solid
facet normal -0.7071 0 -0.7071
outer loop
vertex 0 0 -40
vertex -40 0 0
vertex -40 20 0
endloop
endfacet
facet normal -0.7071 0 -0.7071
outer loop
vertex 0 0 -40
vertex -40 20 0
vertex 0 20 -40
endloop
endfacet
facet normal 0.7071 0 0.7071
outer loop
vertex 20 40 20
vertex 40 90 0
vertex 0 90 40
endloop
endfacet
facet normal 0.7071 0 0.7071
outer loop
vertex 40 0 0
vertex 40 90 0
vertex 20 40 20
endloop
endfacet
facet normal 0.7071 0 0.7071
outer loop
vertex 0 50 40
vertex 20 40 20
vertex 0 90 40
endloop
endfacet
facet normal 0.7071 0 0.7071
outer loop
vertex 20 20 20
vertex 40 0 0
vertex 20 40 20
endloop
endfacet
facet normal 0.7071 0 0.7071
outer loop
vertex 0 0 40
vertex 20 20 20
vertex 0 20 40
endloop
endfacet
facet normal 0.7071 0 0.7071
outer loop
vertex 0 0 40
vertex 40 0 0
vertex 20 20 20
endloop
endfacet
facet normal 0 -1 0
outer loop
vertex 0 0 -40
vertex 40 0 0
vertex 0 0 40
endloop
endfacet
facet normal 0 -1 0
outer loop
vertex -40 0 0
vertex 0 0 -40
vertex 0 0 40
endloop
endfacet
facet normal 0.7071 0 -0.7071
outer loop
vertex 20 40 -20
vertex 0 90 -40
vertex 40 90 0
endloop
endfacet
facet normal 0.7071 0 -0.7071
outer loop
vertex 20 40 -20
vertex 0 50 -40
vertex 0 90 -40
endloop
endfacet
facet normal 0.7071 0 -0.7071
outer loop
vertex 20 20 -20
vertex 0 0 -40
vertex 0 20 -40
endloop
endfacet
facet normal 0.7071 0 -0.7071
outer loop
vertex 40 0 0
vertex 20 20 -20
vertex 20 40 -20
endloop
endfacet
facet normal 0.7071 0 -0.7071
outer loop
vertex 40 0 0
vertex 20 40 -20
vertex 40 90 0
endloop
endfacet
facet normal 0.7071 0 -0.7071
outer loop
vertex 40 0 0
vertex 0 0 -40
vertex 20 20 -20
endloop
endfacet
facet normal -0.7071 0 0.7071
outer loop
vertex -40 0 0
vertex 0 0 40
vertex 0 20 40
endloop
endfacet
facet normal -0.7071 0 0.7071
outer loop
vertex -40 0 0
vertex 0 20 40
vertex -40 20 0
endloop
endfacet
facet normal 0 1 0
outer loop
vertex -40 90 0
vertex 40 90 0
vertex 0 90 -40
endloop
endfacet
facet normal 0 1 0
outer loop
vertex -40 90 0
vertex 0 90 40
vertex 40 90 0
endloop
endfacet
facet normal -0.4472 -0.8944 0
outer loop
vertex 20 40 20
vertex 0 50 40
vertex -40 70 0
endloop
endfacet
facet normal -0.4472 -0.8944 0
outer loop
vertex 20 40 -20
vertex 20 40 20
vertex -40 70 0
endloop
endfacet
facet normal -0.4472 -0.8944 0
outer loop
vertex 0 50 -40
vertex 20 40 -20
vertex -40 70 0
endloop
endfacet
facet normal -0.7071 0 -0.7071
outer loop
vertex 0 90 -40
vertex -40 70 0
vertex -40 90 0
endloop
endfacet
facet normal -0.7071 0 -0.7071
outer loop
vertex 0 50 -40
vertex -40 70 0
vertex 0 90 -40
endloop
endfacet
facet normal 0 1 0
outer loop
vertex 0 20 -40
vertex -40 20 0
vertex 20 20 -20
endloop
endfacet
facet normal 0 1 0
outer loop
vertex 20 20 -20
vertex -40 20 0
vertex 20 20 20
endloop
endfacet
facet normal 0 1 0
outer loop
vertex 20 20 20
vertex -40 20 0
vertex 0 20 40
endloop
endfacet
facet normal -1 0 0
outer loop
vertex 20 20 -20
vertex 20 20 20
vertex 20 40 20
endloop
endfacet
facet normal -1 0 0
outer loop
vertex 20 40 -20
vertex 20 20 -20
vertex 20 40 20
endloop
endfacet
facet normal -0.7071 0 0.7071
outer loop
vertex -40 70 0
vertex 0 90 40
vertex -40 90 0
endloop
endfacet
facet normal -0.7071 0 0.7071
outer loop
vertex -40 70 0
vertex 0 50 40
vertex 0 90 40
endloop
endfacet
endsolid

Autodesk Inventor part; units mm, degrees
ref_plane "YZ Plane" through (0, 0, 0) normal (1, 0, 0) x (0, 1, 0)
ref_plane "XZ Plane" through (0, 0, 0) normal (0, 1, 0) x (-1, 0, 0)
ref_plane "XY Plane" through (0, 0, 0) normal (0, 0, 1) x (1, 0, 0)
sketch "Эскиз1" plane through (0, 0, 0) normal (0, 1, 0) x (-1, 0, 0)
  circle A0 centre (0, 0) radius 40
  line L0 (0, 40) -> (40, 0)
  line L1 (40, 0) -> (0, -40)
  line L2 (0, -40) -> (-40, 0)
  line L3 (-40, 0) -> (0, 40)
  dimension "d0" = 80
extrude "Выдавливание1" add sketch "Эскиз1" along normal blind 90 contours L1 L2 L3 L0
sketch "Эскиз2" plane through (0, 0, 0) normal (0, 0, 1) x (1, 0, 0)
  line L0 (0, 90) -> (-40, 90) projected
  line L1 (-40, 90) -> (-40, 70)
  line L2 (-40, 0) -> (-40, 90) projected
  line L3 (0, 0) -> (-40, 0) projected
  line L4 (-40, 0) -> (-40, 20)
  line L5 (-40, 20) -> (20, 20)
  line L6 (20, 20) -> (20, 40)
  line L7 (20, 40) -> (-40, 70)
  line L8 (-40, 20) -> (-40, 70)
  dimension "d3" = 20
  dimension "d4" = 20
  dimension "d5" = 60
  dimension "d6" = 20
extrude "Выдавливание2" cut sketch "Эскиз2" against normal mid plane 90
properties part number "Деталь1Индивидуал"
